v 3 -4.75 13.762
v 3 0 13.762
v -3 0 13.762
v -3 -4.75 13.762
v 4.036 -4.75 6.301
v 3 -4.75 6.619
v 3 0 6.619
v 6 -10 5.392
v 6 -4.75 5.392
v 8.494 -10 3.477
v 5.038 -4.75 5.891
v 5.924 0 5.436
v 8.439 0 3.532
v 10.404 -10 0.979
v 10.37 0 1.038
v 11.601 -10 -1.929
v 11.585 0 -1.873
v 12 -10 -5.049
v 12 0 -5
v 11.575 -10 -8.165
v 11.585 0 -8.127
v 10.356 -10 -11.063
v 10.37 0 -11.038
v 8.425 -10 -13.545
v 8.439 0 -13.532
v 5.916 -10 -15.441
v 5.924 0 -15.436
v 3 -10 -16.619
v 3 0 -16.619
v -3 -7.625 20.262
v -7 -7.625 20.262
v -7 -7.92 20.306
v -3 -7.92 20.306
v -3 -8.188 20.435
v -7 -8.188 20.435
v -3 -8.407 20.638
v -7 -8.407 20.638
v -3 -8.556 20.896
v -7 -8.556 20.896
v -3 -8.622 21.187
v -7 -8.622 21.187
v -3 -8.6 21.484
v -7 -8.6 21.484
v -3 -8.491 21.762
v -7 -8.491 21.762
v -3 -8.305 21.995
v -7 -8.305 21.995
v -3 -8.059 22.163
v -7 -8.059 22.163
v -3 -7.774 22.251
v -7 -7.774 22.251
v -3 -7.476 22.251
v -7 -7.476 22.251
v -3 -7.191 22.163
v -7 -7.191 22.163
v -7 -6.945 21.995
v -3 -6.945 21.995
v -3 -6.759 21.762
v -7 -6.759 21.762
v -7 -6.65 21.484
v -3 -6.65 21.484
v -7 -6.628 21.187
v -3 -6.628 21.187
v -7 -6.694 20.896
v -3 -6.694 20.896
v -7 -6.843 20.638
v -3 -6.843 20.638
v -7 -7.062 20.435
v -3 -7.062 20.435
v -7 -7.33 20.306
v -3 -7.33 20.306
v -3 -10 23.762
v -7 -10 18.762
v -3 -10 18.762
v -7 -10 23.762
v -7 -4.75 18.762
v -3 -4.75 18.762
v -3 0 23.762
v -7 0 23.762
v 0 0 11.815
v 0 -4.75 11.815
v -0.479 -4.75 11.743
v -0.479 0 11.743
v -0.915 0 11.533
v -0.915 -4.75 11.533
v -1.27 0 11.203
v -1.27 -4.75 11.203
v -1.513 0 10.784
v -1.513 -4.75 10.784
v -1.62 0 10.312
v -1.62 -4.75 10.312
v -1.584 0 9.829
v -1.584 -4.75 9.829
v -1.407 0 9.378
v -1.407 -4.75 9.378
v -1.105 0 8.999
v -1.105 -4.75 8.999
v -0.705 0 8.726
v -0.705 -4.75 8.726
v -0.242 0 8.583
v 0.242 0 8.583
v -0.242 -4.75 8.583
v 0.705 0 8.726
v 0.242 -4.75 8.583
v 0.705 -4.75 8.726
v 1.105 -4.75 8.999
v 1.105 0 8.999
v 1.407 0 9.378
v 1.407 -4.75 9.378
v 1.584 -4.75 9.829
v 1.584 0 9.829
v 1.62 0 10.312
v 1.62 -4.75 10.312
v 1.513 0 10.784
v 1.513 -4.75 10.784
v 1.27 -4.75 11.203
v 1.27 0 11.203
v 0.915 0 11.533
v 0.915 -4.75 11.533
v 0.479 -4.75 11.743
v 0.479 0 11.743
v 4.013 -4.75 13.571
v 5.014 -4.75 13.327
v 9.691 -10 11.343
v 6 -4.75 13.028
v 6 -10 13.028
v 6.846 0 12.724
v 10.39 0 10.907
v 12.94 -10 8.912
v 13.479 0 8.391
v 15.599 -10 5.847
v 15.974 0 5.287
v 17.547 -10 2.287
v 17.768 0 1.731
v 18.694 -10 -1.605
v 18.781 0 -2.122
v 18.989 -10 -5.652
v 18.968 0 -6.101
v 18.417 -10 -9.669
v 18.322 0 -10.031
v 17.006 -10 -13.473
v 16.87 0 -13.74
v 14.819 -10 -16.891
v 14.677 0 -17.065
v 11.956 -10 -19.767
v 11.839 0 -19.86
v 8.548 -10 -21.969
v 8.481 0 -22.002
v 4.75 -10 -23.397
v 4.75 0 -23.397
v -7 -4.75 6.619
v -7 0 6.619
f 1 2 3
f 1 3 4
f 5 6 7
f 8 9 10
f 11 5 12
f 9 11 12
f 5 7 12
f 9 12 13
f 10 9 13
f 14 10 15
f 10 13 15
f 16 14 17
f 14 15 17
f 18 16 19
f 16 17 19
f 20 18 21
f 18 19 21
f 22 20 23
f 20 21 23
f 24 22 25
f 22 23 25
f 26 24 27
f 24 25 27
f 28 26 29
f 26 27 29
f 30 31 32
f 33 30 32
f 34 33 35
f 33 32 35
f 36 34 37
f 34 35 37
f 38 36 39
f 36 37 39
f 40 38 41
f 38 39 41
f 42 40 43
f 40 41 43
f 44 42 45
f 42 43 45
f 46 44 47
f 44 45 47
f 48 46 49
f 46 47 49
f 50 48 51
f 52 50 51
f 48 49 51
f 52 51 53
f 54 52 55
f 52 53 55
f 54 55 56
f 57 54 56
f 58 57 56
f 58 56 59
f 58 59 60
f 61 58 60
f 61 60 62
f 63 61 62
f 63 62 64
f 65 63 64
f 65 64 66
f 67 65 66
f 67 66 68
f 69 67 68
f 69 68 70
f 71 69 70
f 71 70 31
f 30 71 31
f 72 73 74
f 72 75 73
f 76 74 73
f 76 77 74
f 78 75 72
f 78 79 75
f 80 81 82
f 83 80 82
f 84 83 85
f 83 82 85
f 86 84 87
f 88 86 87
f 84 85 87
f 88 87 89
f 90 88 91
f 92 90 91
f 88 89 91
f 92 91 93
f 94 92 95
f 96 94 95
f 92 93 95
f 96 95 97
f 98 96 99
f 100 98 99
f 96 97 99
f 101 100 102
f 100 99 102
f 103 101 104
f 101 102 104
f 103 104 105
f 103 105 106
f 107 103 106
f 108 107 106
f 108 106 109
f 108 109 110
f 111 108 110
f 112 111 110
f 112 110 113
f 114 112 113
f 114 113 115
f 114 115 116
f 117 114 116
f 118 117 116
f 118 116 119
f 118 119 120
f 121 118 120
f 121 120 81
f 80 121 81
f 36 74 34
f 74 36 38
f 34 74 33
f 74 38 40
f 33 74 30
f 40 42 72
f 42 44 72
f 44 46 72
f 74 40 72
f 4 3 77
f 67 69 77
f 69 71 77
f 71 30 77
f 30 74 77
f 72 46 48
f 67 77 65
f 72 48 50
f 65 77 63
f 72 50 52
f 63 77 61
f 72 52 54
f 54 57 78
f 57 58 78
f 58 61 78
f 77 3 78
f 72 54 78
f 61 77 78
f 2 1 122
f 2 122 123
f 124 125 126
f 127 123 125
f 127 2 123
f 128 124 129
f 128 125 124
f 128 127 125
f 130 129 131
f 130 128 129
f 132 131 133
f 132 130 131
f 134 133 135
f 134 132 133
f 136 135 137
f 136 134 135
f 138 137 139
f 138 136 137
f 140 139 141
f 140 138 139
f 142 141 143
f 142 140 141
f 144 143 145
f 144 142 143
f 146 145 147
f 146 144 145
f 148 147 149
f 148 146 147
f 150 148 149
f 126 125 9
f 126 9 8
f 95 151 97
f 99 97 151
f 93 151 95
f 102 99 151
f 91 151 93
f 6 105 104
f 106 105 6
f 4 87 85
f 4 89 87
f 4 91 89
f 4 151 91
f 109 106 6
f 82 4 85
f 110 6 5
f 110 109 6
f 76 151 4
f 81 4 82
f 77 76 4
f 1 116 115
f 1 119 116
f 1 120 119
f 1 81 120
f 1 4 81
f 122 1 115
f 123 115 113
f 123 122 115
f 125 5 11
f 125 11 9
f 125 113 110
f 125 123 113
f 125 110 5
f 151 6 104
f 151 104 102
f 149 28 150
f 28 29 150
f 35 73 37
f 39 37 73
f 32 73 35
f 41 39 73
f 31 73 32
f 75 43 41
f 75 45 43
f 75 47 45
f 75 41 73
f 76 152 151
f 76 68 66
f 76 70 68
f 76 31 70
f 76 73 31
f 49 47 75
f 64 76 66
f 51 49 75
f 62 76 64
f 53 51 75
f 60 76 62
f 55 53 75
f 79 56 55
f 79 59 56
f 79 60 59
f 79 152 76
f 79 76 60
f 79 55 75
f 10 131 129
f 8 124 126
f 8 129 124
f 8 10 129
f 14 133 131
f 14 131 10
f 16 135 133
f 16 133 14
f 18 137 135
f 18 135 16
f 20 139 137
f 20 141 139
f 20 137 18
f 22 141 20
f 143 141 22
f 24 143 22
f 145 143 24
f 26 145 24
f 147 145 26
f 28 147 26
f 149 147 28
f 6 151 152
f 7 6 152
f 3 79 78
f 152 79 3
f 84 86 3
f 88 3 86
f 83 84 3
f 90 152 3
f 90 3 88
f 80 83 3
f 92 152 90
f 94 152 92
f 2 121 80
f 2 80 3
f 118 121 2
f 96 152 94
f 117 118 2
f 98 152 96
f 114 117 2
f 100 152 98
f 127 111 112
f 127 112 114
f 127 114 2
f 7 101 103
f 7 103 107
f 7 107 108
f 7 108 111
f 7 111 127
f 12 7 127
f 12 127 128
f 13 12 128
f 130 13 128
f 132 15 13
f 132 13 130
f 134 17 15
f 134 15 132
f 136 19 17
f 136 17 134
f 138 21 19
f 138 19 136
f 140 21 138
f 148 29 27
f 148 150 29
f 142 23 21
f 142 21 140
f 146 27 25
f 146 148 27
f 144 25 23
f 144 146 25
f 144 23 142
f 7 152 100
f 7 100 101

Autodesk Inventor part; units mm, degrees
ref_plane "YZ Plane" through (0, 0, 0) normal (1, 0, 0) x (0, 1, 0)
ref_plane "XZ Plane" through (0, 0, 0) normal (0, 1, 0) x (-1, 0, 0)
sketch "clawBase" plane through (0, 0, 0) normal (0, 1, 0) x (-1, 0, 0)
  line L0 (-3, -16.619) -> (0, -5)
  line L1 (0, -5) -> (0, 7)
  arc A0 (0, 7) -> (-3, -16.619) centre (0, -5) ccw
  arc A1 (0, 14) -> (-4.75, -23.3967) centre (0, -5) ccw
  line L2 (-3, -16.619) -> (-4.75, -23.3967)
  line L3 (0, 7) -> (0, 14)
  line L4 (0, 0) -> (0, 12)
  dimension "d3" = 12
  dimension "d5" = 7
  dimension "d6" = 0
  dimension "d7" = 5
  dimension "d8" = 3
  dimension "d11" = 12
  dimension "d12" = 0
extrude "clamp" add sketch "clawBase" against normal blind 10 contours L2 A1 L3 A0
ref_plane "reduction" through (3, 0, 7) normal (-1, 0, 0) x (0, 0, 1)
split "reductionSplit" plane through (3, 0, 7) removes the side toward (-1, 0, 0)
sketch "Sketch7" plane through (3, -10, 6.619) normal (-1, 0, 0) x (0, 0, 1)
  line L0 (0, 0) -> (0, 10) projected
  line L1 (7.1427, 0) -> (0, 0) projected
  line L2 (7.1427, 10) -> (7.1427, 0) projected
  line L3 (0, 10) -> (7.1427, 10) projected
  point P0 (-6.619, 10)
extrude "arm_c" add sketch "Sketch7" along normal blind 10
sketch "Sketch8" plane through (-7, 0, 13.7617) normal (0, 0, 1) x (1, 0, 0)
  line L0 (10, -10) -> (0, -10) projected
  line L1 (0, 0) -> (4, 0)
  line L2 (4, 0) -> (4, -10)
  line L3 (4, -10) -> (0, -10)
  line L4 (0, -10) -> (0, 0)
  point P0 (7, 0)
  dimension "d35" = 4
extrude "arb_b" add sketch "Sketch8" along normal blind 10
sketch "Sketch9" plane through (0, 0, 0) normal (0, 1, 0) x (1, 0, 0)
  line L0 (3, -6.619) -> (-7, -6.619) projected
  line L1 (3, -13.7617) -> (-3, -13.7617) projected
  point P0 (0, 0)
  point P1 (0, -10.1903)
  dimension "d39" = 7.1427
  dimension "d41" = 0
  dimension "d42" = 3.5714
hole "pinHole" at (0, 0, 10.1903) direction (0, -1, 0) diameter 3.25 end through all
sketch "Sketch10" plane through (3, -10, 6.619) normal (0, 0, -1) x (-1, 0, 0)
  line L0 (10, 10) -> (10, 0) projected
  line L1 (-3, 0) -> (10, 0)
  line L2 (10, 0) -> (10, 5.25)
  line L3 (10, 5.25) -> (-3, 5.25)
  line L4 (-3, 5.25) -> (-3, 0)
  line L5 (0, 10) -> (0, 0) projected
  line L6 (0, 0) -> (6, 0) projected
  point P0 (3, 10)
  point P1 (10, 0)
  dimension "d50" = 5.25
  dimension "d64" = 3
  dimension "d65" = 0
extrude "halfcut" cut sketch "Sketch10" along normal blind 4.25 and the other way blind 19.75
sketch "Sketch12" plane through (-7, -4.75, 6.619) normal (0, -1, 0) x (1, 0, 0)
  line L0 (0, 0) -> (0, 17.1427) projected
  line L1 (4, 7.1427) -> (4, 17.1427) projected
  line L2 (0, 17.1427) -> (4, 17.1427)
  line L3 (4, 17.1427) -> (4, 12.1427)
  line L4 (4, 12.1427) -> (0, 12.1427)
  line L5 (0, 12.1427) -> (0, 17.1427)
  line L6 (4, 7.1427) -> (10, 7.1427) projected
  point P0 (7, -6.619)
  point P1 (0, 12.1427)
  dimension "d68" = 5
extrude "Extrusion6" add sketch "Sketch12" along normal up to surface (5.25 mm away)
sketch "Sketch11" plane through (-3, 0, 23.7617) normal (1, 0, 0) x (0, 0, -1)
  line L0 (0, -10) -> (0, 0) projected
  line L1 (5, -10) -> (0, -10) projected
  point P0 (23.7617, 0)
  point P1 (2.5, -7.625)
  dimension "d71" = 2.5
  dimension "d72" = 2.375
hole "cableHole" at (-3, -7.625, 21.2617) direction (-1, 0, 0) diameter 2 end through all
equation "\"d3\" = r"
equation "\"d5\" = t"
equation "\"d8\" = 0.5 * a1"
equation "\"d11\" = r"
equation "\"d42\" = 0.5 * d39"
equation "\"d43\" = dpin"
equation "\"d57\" = dcable"
equation "\"r\" = 12"
equation "\"t\" = 7"
equation "\"a1\" = 6"
equation "\"fillet\" = 0.5"
equation "\"d14\" = -0.5 * a2"
equation "\"dpin\" = 3.25"
equation "\"tpinhole\" = t - dpin"
equation "\"linkb\" = d36 + 0.5 * t - d56"
equation "\"dcable\" = 2"
equation "\"a2\" = 6"
equation "\"d36\" = 10"
equation "\"d56\" = 2.137935"
properties part number "holder2_base" material "Steel, Mild"
